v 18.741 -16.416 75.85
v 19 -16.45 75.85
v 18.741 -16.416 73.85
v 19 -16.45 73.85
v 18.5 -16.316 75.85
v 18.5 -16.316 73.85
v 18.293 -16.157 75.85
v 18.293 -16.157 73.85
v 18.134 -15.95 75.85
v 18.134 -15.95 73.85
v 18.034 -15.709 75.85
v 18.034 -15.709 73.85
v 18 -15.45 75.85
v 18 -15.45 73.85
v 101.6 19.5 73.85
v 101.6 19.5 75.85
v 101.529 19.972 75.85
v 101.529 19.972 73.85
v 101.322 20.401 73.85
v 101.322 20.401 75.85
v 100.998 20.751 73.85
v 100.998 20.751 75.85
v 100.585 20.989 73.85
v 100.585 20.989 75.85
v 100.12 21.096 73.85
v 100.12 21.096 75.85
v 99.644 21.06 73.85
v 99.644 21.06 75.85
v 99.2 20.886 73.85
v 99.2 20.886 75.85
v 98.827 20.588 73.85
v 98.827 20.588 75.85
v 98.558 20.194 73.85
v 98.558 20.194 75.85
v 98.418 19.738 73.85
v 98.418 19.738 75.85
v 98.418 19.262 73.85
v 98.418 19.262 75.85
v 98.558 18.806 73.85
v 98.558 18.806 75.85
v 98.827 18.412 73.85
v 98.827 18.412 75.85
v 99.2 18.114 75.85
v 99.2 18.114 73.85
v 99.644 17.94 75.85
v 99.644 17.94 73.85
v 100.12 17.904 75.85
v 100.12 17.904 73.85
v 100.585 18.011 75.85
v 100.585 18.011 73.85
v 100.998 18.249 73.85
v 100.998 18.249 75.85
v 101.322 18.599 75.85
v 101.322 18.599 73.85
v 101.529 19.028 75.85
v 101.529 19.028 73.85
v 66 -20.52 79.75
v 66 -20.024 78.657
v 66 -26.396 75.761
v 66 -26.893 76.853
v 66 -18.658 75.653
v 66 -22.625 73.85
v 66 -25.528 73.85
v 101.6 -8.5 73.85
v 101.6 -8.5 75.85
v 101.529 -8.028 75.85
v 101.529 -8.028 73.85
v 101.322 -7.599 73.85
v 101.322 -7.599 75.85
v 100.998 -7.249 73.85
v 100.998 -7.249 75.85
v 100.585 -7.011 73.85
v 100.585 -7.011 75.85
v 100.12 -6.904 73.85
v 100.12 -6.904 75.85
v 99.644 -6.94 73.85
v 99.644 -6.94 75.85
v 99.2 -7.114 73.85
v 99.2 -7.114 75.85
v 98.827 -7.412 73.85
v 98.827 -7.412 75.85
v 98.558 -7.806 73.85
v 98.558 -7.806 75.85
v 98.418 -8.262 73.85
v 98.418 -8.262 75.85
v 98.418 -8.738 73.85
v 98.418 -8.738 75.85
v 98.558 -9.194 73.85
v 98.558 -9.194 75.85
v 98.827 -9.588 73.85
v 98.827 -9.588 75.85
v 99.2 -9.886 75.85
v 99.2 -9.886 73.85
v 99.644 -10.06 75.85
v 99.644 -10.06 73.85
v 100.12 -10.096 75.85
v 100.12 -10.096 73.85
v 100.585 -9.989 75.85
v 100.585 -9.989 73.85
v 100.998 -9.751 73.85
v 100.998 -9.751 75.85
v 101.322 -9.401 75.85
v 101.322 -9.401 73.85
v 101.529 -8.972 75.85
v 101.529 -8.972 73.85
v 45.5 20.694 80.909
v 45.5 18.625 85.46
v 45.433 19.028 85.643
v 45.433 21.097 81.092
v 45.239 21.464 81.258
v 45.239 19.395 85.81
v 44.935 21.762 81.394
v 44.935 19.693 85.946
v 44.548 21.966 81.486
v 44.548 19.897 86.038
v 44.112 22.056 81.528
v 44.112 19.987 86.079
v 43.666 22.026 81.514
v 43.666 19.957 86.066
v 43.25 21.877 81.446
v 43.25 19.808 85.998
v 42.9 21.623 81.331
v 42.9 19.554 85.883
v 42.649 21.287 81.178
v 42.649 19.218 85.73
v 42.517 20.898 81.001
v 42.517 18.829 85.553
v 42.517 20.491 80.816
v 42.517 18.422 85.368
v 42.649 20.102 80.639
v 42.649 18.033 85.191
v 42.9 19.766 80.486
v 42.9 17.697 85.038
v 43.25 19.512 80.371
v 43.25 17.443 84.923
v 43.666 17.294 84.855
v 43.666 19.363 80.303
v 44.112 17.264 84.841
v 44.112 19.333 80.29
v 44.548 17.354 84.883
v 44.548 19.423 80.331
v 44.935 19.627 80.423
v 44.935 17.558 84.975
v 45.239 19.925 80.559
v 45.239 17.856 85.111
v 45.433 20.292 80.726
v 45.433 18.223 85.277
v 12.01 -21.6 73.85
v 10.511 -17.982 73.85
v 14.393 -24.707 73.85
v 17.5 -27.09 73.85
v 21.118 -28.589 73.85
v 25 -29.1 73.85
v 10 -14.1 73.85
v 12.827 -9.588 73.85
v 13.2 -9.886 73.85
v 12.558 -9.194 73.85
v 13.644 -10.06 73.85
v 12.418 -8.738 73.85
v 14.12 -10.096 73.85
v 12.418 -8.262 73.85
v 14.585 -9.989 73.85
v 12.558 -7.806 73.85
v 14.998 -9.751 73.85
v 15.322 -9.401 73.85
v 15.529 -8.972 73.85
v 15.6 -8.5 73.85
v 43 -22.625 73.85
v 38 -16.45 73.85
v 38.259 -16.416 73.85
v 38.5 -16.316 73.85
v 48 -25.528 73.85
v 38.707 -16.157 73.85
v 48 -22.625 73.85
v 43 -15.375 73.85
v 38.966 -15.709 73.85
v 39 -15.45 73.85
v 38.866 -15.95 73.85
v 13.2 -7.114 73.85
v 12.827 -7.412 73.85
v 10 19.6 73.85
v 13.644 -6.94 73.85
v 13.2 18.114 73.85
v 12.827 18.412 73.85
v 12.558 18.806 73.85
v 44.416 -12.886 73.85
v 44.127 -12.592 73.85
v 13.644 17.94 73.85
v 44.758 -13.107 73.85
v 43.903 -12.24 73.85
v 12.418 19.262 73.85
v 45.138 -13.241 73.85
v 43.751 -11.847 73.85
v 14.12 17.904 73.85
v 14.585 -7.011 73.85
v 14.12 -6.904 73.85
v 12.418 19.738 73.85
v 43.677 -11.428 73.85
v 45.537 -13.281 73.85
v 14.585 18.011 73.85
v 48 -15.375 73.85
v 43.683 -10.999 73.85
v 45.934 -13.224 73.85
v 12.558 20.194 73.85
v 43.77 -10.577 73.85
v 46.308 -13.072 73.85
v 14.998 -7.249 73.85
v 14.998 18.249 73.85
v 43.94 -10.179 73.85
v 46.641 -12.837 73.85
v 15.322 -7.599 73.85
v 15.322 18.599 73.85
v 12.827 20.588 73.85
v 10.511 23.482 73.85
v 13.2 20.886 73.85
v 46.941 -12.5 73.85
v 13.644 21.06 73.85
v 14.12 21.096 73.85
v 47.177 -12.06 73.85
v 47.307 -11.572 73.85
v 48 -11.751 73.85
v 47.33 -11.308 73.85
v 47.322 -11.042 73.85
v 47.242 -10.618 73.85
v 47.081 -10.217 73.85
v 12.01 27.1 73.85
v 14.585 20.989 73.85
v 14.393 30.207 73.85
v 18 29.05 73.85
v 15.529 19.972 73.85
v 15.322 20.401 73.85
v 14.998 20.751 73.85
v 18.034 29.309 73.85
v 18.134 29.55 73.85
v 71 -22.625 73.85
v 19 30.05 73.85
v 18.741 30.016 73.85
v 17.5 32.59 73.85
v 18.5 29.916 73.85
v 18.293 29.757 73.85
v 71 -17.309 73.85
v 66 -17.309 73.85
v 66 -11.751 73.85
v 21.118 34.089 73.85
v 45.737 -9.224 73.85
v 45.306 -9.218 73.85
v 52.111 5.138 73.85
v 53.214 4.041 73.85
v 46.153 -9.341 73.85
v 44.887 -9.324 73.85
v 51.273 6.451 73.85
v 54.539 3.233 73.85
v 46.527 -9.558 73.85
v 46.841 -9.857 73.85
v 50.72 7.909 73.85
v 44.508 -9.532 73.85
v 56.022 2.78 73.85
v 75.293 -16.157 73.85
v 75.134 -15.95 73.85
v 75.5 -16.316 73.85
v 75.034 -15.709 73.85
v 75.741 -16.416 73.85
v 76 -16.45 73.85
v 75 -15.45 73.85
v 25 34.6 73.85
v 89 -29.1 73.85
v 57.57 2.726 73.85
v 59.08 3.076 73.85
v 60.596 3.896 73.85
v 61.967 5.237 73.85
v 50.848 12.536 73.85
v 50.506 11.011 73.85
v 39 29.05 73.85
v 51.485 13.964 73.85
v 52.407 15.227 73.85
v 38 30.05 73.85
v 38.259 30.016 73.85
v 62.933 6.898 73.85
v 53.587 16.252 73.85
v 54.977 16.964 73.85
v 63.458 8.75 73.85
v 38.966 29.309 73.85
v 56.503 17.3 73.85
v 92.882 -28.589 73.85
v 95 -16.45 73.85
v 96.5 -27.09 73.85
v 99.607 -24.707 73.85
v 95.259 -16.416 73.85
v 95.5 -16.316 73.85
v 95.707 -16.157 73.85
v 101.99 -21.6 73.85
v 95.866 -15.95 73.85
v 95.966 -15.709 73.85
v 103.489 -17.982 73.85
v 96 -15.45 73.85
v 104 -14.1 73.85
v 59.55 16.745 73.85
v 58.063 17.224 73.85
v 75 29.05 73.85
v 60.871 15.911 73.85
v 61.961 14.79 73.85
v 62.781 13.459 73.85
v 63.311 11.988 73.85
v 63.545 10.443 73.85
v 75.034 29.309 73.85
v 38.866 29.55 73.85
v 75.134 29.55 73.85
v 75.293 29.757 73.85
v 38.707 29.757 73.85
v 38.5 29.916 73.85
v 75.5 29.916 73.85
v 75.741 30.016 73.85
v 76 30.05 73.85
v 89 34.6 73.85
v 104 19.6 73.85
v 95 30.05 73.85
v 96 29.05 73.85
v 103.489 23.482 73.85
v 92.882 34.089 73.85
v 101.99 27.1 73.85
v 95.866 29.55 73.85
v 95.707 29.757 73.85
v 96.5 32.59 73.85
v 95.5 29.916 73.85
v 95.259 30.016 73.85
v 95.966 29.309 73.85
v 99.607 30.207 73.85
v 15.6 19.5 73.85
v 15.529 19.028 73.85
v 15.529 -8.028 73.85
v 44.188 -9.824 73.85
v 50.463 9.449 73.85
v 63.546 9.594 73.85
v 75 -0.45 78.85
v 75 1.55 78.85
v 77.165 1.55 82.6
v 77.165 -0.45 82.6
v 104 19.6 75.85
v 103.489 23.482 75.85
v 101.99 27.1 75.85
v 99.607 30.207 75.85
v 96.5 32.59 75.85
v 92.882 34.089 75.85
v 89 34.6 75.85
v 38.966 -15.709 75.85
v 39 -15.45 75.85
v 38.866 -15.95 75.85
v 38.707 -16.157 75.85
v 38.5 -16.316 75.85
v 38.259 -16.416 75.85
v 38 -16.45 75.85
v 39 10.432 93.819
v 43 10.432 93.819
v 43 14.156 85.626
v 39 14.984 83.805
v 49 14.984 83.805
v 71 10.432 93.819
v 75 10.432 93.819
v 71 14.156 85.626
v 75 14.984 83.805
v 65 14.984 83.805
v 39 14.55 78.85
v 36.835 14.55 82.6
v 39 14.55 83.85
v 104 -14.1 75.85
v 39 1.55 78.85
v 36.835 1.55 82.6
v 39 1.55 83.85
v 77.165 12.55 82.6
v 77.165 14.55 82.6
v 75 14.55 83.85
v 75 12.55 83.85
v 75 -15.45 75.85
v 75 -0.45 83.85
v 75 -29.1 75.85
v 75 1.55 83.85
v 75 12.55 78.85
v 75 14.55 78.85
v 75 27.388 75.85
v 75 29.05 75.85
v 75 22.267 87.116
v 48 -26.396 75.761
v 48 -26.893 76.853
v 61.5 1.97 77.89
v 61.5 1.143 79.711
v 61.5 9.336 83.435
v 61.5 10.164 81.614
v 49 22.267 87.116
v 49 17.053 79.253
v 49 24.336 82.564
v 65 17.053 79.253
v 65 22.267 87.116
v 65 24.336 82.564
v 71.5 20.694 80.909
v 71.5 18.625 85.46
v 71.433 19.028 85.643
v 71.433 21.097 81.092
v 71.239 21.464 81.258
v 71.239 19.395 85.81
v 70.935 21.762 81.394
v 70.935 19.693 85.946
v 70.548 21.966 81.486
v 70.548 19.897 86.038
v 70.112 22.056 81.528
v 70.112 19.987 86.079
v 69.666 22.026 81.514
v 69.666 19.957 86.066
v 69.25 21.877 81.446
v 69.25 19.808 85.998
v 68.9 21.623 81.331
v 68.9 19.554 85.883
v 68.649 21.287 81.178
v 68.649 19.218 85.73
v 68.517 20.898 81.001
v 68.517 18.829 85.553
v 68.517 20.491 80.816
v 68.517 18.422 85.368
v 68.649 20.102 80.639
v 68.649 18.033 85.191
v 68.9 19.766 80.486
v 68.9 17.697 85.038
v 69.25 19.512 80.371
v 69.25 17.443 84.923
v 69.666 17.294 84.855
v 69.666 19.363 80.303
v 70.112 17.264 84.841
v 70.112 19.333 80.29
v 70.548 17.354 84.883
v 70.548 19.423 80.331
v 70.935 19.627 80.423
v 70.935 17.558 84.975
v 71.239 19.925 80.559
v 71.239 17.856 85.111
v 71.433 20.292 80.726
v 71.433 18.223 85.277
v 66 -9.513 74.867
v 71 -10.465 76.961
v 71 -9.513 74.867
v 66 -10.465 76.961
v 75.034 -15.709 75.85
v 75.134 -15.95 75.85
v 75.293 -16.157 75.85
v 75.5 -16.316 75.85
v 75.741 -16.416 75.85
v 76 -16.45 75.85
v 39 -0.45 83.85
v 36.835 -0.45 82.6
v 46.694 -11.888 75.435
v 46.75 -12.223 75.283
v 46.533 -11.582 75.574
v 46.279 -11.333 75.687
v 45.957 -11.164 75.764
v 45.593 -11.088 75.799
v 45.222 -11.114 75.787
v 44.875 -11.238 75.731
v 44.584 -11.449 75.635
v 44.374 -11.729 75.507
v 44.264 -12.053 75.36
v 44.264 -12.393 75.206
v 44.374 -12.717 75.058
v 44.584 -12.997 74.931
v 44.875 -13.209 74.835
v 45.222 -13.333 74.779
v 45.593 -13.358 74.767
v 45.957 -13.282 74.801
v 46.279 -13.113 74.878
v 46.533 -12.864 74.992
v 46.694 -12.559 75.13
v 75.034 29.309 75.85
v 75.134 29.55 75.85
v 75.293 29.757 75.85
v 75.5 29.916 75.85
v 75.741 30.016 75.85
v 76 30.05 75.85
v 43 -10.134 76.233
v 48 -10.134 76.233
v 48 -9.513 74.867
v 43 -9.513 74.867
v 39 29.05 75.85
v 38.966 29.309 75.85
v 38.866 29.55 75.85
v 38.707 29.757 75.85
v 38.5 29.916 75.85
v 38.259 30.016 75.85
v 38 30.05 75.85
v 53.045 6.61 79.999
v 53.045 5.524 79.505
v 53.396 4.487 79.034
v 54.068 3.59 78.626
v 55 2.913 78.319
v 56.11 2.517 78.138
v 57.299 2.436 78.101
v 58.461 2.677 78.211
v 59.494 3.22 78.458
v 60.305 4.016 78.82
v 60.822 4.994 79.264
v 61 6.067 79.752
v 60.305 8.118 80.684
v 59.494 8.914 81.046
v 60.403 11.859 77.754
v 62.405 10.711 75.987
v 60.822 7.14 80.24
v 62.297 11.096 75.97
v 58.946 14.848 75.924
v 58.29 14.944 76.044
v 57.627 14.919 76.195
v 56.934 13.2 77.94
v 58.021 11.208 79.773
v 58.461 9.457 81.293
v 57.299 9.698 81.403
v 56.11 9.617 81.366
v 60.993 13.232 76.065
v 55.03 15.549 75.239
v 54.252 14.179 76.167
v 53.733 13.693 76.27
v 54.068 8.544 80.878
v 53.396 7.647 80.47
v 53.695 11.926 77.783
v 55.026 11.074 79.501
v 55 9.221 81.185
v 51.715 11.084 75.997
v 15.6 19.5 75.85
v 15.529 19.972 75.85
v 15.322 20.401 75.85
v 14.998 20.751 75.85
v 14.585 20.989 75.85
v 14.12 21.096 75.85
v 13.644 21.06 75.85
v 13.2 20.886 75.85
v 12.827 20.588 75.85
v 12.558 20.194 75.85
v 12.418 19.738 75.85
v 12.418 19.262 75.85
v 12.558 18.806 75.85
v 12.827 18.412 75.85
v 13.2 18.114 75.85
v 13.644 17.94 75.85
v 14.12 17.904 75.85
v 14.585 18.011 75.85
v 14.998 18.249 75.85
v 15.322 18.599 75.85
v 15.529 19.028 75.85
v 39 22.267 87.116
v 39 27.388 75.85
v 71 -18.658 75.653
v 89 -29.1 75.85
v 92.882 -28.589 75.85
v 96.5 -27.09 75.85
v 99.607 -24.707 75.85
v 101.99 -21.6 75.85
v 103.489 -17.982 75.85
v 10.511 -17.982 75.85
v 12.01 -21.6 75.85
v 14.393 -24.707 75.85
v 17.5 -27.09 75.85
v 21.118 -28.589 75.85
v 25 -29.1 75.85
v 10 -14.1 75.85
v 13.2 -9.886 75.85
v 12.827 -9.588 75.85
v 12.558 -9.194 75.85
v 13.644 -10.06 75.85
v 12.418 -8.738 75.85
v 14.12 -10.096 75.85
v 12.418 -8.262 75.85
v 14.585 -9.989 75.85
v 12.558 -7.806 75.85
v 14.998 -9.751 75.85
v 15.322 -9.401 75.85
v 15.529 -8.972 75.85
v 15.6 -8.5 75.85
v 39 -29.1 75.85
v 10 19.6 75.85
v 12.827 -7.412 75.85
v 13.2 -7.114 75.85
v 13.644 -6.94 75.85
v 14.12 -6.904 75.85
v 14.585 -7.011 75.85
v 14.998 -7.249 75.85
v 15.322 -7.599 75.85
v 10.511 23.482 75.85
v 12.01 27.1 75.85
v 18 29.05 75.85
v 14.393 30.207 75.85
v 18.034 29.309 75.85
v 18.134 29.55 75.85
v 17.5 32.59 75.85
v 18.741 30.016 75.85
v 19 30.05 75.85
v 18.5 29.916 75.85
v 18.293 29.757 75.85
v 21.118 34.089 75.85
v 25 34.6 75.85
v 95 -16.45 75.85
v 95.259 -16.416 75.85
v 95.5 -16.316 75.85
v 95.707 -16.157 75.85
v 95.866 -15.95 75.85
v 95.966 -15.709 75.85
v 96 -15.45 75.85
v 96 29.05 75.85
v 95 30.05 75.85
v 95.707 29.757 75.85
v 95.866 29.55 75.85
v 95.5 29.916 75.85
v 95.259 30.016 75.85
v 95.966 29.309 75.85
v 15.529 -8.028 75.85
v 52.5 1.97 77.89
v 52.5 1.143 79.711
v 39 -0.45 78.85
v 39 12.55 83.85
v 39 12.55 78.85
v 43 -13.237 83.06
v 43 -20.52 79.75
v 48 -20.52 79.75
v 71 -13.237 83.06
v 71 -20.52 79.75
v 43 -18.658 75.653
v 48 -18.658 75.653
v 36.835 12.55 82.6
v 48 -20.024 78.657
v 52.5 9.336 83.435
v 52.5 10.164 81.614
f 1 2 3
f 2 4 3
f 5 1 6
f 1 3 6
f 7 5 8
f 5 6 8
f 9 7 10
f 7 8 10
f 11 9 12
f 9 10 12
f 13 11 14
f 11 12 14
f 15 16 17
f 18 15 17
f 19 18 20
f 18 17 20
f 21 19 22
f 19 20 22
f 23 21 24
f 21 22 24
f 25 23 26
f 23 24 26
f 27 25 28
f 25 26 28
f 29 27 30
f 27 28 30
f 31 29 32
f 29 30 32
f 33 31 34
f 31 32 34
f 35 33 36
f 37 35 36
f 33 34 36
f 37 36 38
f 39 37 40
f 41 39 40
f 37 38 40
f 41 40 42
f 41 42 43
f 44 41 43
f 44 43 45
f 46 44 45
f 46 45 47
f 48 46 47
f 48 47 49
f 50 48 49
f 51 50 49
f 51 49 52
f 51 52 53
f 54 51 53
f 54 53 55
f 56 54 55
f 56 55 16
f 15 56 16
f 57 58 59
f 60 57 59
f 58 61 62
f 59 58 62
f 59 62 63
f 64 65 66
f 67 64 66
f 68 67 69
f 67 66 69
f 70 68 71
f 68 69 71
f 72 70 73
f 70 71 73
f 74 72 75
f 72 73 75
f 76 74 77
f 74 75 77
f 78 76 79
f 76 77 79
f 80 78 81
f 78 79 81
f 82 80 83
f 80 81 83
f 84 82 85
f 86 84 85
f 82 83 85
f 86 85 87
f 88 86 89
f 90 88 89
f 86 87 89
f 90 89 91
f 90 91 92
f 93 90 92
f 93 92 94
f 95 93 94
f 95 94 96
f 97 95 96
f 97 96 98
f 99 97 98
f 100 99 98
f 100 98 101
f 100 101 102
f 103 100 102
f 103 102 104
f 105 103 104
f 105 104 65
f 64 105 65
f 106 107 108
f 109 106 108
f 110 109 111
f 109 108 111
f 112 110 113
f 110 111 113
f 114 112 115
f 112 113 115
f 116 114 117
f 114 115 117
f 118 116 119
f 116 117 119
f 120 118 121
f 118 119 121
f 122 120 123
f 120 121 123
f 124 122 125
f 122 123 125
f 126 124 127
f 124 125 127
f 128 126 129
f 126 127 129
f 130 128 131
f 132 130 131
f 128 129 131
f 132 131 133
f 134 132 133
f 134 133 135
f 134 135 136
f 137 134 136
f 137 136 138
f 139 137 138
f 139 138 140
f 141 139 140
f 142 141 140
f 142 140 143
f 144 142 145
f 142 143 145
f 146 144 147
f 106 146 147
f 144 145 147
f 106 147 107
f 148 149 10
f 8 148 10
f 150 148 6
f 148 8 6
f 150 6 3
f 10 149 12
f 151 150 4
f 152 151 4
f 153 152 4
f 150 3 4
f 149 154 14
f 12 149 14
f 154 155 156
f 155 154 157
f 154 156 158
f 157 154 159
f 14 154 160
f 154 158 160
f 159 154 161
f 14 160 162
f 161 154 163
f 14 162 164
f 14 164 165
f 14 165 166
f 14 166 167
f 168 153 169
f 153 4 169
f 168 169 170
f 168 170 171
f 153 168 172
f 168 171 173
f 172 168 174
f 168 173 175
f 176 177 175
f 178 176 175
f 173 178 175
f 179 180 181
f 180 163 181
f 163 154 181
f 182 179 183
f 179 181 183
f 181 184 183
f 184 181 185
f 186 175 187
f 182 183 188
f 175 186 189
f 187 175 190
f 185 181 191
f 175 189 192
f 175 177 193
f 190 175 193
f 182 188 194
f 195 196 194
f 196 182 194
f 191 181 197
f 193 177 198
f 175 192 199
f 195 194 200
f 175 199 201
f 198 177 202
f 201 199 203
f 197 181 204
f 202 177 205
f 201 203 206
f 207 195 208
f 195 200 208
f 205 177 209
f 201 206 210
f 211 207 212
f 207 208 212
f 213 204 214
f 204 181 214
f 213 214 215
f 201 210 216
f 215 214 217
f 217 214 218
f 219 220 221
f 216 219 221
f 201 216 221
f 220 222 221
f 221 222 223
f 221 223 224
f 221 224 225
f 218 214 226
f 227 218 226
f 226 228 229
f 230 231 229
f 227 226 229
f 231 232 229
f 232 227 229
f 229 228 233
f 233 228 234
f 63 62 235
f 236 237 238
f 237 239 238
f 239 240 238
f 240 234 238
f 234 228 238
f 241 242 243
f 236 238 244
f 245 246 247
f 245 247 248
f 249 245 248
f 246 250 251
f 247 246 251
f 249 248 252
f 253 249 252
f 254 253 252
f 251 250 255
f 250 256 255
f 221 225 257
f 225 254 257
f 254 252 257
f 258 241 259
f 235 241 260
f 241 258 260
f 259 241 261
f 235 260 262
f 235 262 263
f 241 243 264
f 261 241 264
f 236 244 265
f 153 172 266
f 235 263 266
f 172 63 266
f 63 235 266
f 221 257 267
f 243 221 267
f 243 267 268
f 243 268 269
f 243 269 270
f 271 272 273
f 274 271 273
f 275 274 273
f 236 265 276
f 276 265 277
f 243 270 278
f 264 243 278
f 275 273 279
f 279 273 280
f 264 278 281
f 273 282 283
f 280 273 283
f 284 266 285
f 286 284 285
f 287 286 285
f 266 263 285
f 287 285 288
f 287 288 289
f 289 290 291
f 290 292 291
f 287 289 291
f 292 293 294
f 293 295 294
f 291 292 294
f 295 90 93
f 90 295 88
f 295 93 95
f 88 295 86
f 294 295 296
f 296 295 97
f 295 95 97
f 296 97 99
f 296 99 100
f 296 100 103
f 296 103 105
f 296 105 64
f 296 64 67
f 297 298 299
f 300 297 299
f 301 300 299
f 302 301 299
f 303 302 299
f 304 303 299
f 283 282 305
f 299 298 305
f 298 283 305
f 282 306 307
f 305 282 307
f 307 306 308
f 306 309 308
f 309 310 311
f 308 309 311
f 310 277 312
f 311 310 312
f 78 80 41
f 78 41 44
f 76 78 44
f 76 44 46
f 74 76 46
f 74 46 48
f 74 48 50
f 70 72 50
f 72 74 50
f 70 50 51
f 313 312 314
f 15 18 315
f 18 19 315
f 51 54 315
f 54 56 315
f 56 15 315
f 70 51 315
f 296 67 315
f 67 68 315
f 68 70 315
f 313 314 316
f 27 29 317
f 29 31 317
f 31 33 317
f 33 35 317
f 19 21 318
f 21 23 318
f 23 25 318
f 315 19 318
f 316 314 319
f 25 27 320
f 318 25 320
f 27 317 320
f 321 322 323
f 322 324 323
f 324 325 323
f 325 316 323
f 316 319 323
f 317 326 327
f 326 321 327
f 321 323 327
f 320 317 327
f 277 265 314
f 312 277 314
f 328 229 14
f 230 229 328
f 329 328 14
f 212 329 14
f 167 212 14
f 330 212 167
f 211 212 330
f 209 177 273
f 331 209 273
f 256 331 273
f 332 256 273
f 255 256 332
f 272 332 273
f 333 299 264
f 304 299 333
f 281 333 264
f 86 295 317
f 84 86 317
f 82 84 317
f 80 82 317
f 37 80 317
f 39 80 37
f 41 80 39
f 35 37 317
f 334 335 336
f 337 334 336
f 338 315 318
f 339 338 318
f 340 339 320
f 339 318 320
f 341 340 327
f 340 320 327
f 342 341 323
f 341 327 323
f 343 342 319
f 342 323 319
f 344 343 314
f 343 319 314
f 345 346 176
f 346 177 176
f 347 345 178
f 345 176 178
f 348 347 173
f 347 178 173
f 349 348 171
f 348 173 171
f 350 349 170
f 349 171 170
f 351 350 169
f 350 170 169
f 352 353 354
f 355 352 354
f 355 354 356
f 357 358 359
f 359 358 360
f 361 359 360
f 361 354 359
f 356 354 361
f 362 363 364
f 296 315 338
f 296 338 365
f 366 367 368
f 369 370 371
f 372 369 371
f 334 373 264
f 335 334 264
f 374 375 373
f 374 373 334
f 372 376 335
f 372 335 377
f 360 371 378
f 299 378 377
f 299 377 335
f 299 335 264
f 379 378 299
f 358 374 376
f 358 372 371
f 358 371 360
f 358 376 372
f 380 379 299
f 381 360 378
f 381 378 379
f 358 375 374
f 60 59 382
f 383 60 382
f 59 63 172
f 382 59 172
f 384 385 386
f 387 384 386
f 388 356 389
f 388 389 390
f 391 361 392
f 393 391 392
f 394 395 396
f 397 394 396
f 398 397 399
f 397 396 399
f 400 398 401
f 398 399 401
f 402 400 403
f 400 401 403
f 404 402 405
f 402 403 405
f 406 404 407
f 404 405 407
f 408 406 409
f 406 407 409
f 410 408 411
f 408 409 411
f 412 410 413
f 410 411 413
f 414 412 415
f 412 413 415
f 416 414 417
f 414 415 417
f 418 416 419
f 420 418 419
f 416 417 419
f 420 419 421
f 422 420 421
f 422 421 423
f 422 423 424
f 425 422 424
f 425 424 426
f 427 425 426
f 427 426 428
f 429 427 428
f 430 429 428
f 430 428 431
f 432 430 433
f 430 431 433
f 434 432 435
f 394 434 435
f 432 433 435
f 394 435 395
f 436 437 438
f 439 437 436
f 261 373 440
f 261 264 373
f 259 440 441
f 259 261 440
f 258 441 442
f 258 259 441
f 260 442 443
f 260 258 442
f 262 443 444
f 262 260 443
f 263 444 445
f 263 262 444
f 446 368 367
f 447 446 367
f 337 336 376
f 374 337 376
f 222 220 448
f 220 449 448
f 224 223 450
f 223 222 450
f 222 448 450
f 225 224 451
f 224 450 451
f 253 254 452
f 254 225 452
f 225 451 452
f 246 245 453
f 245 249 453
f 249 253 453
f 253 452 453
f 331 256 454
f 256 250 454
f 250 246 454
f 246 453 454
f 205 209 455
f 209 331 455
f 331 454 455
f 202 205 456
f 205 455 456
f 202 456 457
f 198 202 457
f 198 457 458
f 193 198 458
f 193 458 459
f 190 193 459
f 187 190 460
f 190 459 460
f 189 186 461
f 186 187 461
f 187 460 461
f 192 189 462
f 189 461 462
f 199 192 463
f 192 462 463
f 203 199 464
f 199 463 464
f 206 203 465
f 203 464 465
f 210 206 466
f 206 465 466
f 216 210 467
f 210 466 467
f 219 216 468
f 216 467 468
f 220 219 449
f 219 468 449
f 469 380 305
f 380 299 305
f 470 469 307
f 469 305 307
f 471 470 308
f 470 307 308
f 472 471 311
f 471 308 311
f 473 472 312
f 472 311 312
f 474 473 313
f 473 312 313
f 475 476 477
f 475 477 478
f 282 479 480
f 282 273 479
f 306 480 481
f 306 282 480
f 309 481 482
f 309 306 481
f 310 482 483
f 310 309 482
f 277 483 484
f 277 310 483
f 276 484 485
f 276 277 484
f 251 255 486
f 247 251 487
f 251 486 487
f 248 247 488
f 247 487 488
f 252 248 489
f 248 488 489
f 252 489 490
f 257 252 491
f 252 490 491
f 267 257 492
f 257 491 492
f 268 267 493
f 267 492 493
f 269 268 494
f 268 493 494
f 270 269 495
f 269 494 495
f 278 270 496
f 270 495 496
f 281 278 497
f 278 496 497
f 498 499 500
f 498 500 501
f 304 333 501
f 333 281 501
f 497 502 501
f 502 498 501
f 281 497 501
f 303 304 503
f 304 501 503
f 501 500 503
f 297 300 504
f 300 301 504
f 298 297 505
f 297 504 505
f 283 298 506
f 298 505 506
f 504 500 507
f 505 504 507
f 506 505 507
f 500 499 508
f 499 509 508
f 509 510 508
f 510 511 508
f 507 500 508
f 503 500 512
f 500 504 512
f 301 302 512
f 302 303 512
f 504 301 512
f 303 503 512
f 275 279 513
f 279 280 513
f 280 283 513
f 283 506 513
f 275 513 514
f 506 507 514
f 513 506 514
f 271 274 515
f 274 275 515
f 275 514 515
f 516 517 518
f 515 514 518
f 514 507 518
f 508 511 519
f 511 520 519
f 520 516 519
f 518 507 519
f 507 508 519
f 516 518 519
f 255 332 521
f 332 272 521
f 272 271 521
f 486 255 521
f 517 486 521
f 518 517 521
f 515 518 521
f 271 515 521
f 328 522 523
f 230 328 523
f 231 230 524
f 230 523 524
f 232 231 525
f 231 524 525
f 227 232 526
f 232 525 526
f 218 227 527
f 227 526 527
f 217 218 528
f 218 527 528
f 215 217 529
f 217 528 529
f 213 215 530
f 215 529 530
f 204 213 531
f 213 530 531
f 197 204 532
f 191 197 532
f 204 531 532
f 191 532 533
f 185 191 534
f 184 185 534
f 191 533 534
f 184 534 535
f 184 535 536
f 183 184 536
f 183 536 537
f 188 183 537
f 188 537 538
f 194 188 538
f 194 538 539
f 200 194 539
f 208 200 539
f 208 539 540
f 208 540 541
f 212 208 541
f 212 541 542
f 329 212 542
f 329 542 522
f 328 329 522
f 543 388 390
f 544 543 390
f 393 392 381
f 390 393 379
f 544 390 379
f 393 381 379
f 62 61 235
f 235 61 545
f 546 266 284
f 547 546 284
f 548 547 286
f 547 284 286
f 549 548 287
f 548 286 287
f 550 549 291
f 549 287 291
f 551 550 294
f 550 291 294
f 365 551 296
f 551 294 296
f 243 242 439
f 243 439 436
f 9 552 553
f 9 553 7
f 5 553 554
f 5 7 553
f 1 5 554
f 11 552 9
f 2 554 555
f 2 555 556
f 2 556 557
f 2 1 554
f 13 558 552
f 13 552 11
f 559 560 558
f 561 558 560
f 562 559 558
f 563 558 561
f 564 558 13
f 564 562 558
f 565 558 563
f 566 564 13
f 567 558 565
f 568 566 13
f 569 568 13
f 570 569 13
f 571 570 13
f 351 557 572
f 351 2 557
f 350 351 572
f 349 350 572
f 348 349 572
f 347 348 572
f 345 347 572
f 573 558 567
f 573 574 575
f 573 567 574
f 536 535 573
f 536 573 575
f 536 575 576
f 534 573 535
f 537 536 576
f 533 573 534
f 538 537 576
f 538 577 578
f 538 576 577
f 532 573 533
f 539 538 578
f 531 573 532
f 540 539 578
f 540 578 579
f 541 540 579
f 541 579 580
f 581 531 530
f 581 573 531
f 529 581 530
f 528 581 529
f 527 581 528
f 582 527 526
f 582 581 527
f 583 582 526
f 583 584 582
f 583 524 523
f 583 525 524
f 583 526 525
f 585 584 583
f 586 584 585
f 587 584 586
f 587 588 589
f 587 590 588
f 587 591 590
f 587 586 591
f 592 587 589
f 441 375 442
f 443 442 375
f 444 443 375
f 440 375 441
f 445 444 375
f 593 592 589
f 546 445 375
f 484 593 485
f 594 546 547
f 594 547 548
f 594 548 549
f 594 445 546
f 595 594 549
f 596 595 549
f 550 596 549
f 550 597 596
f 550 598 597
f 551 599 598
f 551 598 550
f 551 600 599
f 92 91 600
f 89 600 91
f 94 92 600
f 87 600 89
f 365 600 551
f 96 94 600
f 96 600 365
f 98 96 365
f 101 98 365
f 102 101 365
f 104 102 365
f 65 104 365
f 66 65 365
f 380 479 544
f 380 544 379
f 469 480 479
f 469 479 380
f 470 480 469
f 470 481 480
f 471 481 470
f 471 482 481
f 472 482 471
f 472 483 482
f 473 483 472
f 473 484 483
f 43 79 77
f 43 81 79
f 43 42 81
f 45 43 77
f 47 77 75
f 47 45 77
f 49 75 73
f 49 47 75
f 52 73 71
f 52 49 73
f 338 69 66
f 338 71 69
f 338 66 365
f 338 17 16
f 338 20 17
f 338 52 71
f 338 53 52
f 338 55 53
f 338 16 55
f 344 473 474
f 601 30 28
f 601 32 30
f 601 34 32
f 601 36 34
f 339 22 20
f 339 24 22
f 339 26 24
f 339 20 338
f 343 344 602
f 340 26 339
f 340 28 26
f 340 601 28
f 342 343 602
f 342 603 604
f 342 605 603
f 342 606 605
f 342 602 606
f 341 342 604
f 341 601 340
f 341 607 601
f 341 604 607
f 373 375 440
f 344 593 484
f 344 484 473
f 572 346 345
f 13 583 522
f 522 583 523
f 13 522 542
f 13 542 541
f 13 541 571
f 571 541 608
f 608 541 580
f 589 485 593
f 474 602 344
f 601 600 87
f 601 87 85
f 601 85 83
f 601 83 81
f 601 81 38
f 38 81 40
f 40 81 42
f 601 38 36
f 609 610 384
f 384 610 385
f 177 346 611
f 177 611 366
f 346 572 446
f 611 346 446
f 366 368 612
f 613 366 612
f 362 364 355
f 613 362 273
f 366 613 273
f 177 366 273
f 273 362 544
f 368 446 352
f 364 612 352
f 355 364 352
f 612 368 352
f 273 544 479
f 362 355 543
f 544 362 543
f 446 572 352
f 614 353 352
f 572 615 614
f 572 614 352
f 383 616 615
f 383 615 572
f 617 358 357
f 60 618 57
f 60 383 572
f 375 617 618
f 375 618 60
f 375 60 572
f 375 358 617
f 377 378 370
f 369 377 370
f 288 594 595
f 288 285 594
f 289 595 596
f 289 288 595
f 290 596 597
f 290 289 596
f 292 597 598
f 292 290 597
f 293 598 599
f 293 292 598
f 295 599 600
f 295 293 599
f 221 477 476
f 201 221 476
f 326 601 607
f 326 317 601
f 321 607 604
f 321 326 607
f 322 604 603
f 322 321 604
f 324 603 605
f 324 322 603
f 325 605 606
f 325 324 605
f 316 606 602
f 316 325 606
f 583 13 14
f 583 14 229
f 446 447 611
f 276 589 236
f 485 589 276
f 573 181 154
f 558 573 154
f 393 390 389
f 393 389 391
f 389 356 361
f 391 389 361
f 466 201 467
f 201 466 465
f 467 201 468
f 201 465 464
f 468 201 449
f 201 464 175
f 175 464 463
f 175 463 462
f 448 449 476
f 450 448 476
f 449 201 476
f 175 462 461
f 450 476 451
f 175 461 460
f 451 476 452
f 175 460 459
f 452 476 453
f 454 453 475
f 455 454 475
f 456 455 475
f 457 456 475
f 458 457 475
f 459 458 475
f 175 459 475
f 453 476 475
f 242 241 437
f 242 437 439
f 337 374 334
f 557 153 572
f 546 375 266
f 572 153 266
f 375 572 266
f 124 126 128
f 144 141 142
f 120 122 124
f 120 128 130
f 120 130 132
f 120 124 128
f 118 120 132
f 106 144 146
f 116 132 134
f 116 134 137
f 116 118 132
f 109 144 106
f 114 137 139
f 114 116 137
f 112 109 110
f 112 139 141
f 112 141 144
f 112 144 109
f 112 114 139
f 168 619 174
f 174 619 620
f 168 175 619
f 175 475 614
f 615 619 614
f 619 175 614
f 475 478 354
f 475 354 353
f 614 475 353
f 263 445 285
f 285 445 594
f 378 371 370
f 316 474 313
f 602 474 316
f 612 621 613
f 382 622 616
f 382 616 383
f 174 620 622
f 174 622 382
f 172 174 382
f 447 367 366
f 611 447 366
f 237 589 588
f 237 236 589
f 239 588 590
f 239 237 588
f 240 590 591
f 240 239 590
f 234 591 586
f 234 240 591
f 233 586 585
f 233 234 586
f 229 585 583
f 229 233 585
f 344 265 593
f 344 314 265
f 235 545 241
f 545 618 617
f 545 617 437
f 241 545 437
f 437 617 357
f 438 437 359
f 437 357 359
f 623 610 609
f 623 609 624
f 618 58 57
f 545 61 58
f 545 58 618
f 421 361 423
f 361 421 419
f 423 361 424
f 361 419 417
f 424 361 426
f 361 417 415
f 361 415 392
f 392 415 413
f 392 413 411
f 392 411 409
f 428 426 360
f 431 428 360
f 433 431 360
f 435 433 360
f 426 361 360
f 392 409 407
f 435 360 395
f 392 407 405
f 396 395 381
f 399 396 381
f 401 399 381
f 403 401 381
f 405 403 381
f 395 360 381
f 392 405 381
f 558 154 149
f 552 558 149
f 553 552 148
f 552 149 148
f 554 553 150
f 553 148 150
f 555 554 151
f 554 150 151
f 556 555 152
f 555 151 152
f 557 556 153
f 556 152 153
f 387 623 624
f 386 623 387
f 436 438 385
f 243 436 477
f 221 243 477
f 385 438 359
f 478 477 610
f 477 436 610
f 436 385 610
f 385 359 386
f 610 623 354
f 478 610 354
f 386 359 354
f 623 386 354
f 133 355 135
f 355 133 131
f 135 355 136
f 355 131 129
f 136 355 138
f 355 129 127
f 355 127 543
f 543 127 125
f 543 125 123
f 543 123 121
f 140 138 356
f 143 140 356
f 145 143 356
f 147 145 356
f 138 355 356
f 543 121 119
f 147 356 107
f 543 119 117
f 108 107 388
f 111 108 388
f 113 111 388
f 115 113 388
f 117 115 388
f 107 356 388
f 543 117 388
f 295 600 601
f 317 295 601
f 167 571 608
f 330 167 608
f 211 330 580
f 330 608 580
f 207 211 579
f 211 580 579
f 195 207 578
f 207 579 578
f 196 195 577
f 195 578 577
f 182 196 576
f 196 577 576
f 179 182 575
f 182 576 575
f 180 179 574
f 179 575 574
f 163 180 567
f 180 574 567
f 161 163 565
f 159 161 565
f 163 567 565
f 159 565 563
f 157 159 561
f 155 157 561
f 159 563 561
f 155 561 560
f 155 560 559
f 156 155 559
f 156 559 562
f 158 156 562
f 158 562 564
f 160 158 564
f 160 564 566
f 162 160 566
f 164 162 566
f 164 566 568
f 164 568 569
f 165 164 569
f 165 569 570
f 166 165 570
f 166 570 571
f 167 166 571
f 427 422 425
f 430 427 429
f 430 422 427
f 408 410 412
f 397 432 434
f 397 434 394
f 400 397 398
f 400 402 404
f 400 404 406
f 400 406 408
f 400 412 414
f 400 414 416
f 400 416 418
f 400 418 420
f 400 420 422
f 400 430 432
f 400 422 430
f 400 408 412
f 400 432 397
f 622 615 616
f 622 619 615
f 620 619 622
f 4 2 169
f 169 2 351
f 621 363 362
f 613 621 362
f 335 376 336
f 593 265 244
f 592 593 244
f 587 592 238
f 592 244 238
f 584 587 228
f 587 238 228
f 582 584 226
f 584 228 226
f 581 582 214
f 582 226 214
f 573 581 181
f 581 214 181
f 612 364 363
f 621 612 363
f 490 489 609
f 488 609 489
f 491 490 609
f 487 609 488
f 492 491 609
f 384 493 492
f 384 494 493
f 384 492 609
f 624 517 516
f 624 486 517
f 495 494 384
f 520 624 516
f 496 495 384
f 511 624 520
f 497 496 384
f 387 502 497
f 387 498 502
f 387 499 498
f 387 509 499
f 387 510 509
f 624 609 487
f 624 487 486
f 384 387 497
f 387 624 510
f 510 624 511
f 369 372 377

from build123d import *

# Parameters (mm, degrees)
PAD127_DEPTH       = 2
PAD128_DEPTH       = 18
PAD128_DEPTH_BACK  = 18
SKETCH333_W        = 21
SKETCH333_H        = 46.5
POCKET160_DEPTH    = 2
FILLET052_R        = 1
POCKET161_DEPTH    = 36
SKETCH335_W        = 28
SKETCH335_H        = 9
POCKET162_DEPTH    = 26
POCKET163_DEPTH    = 15
POCKET164_DEPTH    = 8
POCKET164_FACE50_W = 7
POCKET164_FACE50_H = 18
POCKET165_DEPTH    = 5
SKETCH338_R        = 5
SKETCH337_R        = 1.25
SKETCH339_W        = 9
SKETCH339_H        = 9
POCKET166_DEPTH    = 2
SKETCH341_R        = 12
SKETCH340_R        = 4
SKETCH_R           = 1.6
POCKET_DEPTH       = 5
PAD_DEPTH          = 2
PAD129_DEPTH       = 2
SKETCH346_R        = 1.5
POCKET167_DEPTH    = 5
SKETCH349_W        = 16
SKETCH349_H        = 8
POCKET169_DEPTH    = 5


with BuildPart() as part:
    # Sketch331 → Pad127 (new body)
    with BuildSketch(Plane.XY.offset(42)):
        with BuildLine():
            ThreePointArc((10, 0.35), (14.3933982822, -10.2566017178), (25, -14.65))
            Line((25, -14.65), (89, -14.65))
            ThreePointArc((89, -14.65), (99.6066017178, -10.2566017178), (104, 0.35))
            Line((104, 34.05), (104, 0.35))
            ThreePointArc((104, 34.05), (99.6066017178, 44.6566017178), (89, 49.05))
            Line((25, 49.05), (89, 49.05))
            ThreePointArc((25, 49.05), (14.3933982822, 44.6566017178), (10, 34.05))
            Line((10, 34.05), (10, 0.35))
        make_face()
    extrude(amount=PAD127_DEPTH)

    # Sketch332 → Pad128 (join, two sides)
    with BuildSketch(Plane.YZ.offset(57)) as pad128_sk:
        Polygon((-14.65, 44), (49.05, 44), (49.05, 72.9546061157), align=None)
    extrude(amount=PAD128_DEPTH)
    extrude(pad128_sk.sketch, amount=-PAD128_DEPTH_BACK)

    # Sketch333 (on Face8 of Pad128) → Pocket160 (cut)
    with BuildSketch(Plane.XY.offset(44)):
        with Locations((85.5, 21.25)):
            Rectangle(SKETCH333_W, SKETCH333_H)
        with Locations((28.5, 21.25)):
            Rectangle(SKETCH333_W, SKETCH333_H)
    extrude(amount=-POCKET160_DEPTH, mode=Mode.SUBTRACT)

    # Fillet052
    fillet052_edges = [part.edges().sort_by_distance(p)[0] for p in [
        (75, 44.5, 43),
        (96, 44.5, 43),
        (75, -2, 43),
        (96, -2, 43),
        (18, -2, 43),
        (39, -2, 43),
        (39, 44.5, 43),
        (18, 44.5, 43),
    ]]
    fillet(fillet052_edges, radius=FILLET052_R)

    # Sketch334 (on Face31 of Fillet052) → Pocket161 (cut)
    with BuildSketch(Plane.YZ.offset(75)):
        Polygon((41.8376729515, 44), (49.05, 44), (49.05, 72.9546061157), (24.8821634172, 61.9692028359), (29.4340037078, 51.9551751763), (36.7169329149, 55.2656044786), align=None)
    extrude(amount=-POCKET161_DEPTH, mode=Mode.SUBTRACT)

    # Sketch335 (on Face32 of Pocket161) → Pocket162 (cut)
    with BuildSketch(Plane(origin=(0, 43.9660990716, 19.9846323558), x_dir=(-1, 0, 0), z_dir=(0, 0.9103661509, 0.4138036628))):
        with Locations((-57, 41.6183342984)):
            Rectangle(SKETCH335_W, SKETCH335_H)
    extrude(amount=-POCKET162_DEPTH, mode=Mode.SUBTRACT)

    # Sketch336 (on Face36 of Pocket162) → Pocket163 (cut)
    with BuildSketch(Plane(origin=(0, 20.2965791488, 9.2257371233), x_dir=(-1, 0, 0), z_dir=(0, 0.9103661509, 0.4138036628))):
        Polygon((-71, 41.6183342984), (-71, 39.4183342984), (-66, 39.4183342984), (-66, 37.1183342984), (-48, 37.1183342984), (-48, 38.6183342984), (-43, 38.6183342984), (-43, 41.6183342984), (-48, 41.6183342984), (-48, 44.9183342984), (-66, 44.9183342984), (-66, 41.6183342984), align=None)
    extrude(amount=-POCKET163_DEPTH, mode=Mode.SUBTRACT)

    # Pocket163 Face47 → Pocket164 (cut)
    with BuildSketch(Plane(origin=(57, 1.9222608566, 49.6491526771), x_dir=(1, 0, 0), z_dir=(0, 0.9103661509, 0.4138036628))):
        Polygon((14, -1.7148648649), (14, 2.7851351351), (9, 2.7851351351), (9, -0.5148648649), (-9, -0.5148648649), (-9, 2.7851351351), (-14, 2.7851351351), (-14, -1.7148648649), align=None)
    extrude(amount=-POCKET164_DEPTH, mode=Mode.SUBTRACT)

    # Pocket164 Face50 → Pocket165 (cut)
    with BuildSketch(Plane(origin=(57, -8.7600028454, 45.3591261002), x_dir=(0, -0.9103661509, -0.4138036628), z_dir=(0, 0.4138036628, -0.9103661509))):
        Rectangle(POCKET164_FACE50_W, POCKET164_FACE50_H)
    extrude(amount=-POCKET165_DEPTH, mode=Mode.SUBTRACT)

    # Sketch338 (on Face15 of Pocket165) → SubtractiveLoft002 section 0
    with BuildSketch(Plane(origin=(0, -11.594089358, 25.5069431492), x_dir=(1, 0, 0), z_dir=(0, -0.4138036628, 0.9103661509))):
        with Locations((45.5, 20)):
            Circle(SKETCH338_R)
    # Sketch337 (on Face15 of Pocket165) → SubtractiveLoft002 section 1
    with BuildSketch(Plane(origin=(0, -15.9804081835, 35.1568243485), x_dir=(1, 0, 0), z_dir=(0, -0.4138036628, 0.9103661509))):
        with Locations((45.5, 20)):
            Circle(SKETCH337_R)
    loft(mode=Mode.SUBTRACT)

    # Sketch339 (on Face49 of SubtractiveLoft002) → Pocket166 (cut)
    with BuildSketch(Plane(origin=(0, -15.3597026894, 33.7912751222), x_dir=(1, 0, 0), z_dir=(0, -0.4138036628, 0.9103661509))):
        with Locations((57, 38.5)):
            Rectangle(SKETCH339_W, SKETCH339_H)
    extrude(amount=-POCKET166_DEPTH, mode=Mode.SUBTRACT)

    # Sketch341 (on Face64 of Pocket166) → SubtractiveLoft003 section 0
    with BuildSketch(Plane(origin=(0, -5.8008380789, 12.761817037), x_dir=(1, 0, 0), z_dir=(0, -0.4138036628, 0.9103661509))):
        with Locations((57, 38.5)):
            Circle(SKETCH341_R)
    # Sketch340 (on Face64 of Pocket166) → SubtractiveLoft003 section 1
    with BuildSketch(Plane(origin=(0, -14.5320953638, 31.9705428205), x_dir=(1, 0, 0), z_dir=(0, -0.4138036628, 0.9103661509))):
        with Locations((57, 38.5)):
            Circle(SKETCH340_R)
    loft(mode=Mode.SUBTRACT)

    # Sketch (on Face42 of SubtractiveLoft003) → Pocket (cut)
    with BuildSketch(Plane.XY.offset(44)):
        with Locations((14, 33.95)):
            Circle(SKETCH_R)
        with Locations((100, 33.95)):
            Circle(SKETCH_R)
        with Locations((100, 5.95)):
            Circle(SKETCH_R)
        with Locations((14, 5.95)):
            Circle(SKETCH_R)
    extrude(amount=-POCKET_DEPTH, mode=Mode.SUBTRACT)

    # Sketch344 → Pad (join)
    with BuildSketch(Plane.XZ.offset(-29)):
        Polygon((39, 47), (39, 52), (36.8349364905, 50.75), align=None)
        Polygon((75, 52), (75, 47), (77.1650635095, 50.75), align=None)
    extrude(amount=PAD_DEPTH)

    # Sketch345 → Pad129 (join)
    with BuildSketch(Plane.XZ.offset(-16)):
        Polygon((39, 47), (39, 52), (36.8349364905, 50.75), align=None)
        Polygon((75, 52), (75, 47), (77.1650635095, 50.75), align=None)
    extrude(amount=PAD129_DEPTH)

    # Sketch346 (on Face69 of Pad129) → Pocket167 (cut)
    with BuildSketch(Plane(origin=(0, -14.5320953638, 31.9705428205), x_dir=(1, 0, 0), z_dir=(0, -0.4138036628, 0.9103661509))):
        with Locations((44, 52.2949624492)):
            Circle(SKETCH346_R)
        with Locations((70, 52.2949624492)):
            Circle(SKETCH346_R)
    extrude(amount=-POCKET167_DEPTH, mode=Mode.SUBTRACT)

    # Sketch349 (on Face69 of Pocket167) → Pocket169 (cut)
    with BuildSketch(Plane(origin=(0, -14.5320953638, 31.9705428205), x_dir=(1, 0, 0), z_dir=(0, -0.4138036628, 0.9103661509))):
        with Locations((57, 52.2949624492)):
            Rectangle(SKETCH349_W, SKETCH349_H)
    extrude(amount=-POCKET169_DEPTH, mode=Mode.SUBTRACT)


with BuildPart() as part_1:
    # Body088 placement: moved
    add(part.part.moved(Location((0, -14.45, 31.85))))


solid = part_1.part
